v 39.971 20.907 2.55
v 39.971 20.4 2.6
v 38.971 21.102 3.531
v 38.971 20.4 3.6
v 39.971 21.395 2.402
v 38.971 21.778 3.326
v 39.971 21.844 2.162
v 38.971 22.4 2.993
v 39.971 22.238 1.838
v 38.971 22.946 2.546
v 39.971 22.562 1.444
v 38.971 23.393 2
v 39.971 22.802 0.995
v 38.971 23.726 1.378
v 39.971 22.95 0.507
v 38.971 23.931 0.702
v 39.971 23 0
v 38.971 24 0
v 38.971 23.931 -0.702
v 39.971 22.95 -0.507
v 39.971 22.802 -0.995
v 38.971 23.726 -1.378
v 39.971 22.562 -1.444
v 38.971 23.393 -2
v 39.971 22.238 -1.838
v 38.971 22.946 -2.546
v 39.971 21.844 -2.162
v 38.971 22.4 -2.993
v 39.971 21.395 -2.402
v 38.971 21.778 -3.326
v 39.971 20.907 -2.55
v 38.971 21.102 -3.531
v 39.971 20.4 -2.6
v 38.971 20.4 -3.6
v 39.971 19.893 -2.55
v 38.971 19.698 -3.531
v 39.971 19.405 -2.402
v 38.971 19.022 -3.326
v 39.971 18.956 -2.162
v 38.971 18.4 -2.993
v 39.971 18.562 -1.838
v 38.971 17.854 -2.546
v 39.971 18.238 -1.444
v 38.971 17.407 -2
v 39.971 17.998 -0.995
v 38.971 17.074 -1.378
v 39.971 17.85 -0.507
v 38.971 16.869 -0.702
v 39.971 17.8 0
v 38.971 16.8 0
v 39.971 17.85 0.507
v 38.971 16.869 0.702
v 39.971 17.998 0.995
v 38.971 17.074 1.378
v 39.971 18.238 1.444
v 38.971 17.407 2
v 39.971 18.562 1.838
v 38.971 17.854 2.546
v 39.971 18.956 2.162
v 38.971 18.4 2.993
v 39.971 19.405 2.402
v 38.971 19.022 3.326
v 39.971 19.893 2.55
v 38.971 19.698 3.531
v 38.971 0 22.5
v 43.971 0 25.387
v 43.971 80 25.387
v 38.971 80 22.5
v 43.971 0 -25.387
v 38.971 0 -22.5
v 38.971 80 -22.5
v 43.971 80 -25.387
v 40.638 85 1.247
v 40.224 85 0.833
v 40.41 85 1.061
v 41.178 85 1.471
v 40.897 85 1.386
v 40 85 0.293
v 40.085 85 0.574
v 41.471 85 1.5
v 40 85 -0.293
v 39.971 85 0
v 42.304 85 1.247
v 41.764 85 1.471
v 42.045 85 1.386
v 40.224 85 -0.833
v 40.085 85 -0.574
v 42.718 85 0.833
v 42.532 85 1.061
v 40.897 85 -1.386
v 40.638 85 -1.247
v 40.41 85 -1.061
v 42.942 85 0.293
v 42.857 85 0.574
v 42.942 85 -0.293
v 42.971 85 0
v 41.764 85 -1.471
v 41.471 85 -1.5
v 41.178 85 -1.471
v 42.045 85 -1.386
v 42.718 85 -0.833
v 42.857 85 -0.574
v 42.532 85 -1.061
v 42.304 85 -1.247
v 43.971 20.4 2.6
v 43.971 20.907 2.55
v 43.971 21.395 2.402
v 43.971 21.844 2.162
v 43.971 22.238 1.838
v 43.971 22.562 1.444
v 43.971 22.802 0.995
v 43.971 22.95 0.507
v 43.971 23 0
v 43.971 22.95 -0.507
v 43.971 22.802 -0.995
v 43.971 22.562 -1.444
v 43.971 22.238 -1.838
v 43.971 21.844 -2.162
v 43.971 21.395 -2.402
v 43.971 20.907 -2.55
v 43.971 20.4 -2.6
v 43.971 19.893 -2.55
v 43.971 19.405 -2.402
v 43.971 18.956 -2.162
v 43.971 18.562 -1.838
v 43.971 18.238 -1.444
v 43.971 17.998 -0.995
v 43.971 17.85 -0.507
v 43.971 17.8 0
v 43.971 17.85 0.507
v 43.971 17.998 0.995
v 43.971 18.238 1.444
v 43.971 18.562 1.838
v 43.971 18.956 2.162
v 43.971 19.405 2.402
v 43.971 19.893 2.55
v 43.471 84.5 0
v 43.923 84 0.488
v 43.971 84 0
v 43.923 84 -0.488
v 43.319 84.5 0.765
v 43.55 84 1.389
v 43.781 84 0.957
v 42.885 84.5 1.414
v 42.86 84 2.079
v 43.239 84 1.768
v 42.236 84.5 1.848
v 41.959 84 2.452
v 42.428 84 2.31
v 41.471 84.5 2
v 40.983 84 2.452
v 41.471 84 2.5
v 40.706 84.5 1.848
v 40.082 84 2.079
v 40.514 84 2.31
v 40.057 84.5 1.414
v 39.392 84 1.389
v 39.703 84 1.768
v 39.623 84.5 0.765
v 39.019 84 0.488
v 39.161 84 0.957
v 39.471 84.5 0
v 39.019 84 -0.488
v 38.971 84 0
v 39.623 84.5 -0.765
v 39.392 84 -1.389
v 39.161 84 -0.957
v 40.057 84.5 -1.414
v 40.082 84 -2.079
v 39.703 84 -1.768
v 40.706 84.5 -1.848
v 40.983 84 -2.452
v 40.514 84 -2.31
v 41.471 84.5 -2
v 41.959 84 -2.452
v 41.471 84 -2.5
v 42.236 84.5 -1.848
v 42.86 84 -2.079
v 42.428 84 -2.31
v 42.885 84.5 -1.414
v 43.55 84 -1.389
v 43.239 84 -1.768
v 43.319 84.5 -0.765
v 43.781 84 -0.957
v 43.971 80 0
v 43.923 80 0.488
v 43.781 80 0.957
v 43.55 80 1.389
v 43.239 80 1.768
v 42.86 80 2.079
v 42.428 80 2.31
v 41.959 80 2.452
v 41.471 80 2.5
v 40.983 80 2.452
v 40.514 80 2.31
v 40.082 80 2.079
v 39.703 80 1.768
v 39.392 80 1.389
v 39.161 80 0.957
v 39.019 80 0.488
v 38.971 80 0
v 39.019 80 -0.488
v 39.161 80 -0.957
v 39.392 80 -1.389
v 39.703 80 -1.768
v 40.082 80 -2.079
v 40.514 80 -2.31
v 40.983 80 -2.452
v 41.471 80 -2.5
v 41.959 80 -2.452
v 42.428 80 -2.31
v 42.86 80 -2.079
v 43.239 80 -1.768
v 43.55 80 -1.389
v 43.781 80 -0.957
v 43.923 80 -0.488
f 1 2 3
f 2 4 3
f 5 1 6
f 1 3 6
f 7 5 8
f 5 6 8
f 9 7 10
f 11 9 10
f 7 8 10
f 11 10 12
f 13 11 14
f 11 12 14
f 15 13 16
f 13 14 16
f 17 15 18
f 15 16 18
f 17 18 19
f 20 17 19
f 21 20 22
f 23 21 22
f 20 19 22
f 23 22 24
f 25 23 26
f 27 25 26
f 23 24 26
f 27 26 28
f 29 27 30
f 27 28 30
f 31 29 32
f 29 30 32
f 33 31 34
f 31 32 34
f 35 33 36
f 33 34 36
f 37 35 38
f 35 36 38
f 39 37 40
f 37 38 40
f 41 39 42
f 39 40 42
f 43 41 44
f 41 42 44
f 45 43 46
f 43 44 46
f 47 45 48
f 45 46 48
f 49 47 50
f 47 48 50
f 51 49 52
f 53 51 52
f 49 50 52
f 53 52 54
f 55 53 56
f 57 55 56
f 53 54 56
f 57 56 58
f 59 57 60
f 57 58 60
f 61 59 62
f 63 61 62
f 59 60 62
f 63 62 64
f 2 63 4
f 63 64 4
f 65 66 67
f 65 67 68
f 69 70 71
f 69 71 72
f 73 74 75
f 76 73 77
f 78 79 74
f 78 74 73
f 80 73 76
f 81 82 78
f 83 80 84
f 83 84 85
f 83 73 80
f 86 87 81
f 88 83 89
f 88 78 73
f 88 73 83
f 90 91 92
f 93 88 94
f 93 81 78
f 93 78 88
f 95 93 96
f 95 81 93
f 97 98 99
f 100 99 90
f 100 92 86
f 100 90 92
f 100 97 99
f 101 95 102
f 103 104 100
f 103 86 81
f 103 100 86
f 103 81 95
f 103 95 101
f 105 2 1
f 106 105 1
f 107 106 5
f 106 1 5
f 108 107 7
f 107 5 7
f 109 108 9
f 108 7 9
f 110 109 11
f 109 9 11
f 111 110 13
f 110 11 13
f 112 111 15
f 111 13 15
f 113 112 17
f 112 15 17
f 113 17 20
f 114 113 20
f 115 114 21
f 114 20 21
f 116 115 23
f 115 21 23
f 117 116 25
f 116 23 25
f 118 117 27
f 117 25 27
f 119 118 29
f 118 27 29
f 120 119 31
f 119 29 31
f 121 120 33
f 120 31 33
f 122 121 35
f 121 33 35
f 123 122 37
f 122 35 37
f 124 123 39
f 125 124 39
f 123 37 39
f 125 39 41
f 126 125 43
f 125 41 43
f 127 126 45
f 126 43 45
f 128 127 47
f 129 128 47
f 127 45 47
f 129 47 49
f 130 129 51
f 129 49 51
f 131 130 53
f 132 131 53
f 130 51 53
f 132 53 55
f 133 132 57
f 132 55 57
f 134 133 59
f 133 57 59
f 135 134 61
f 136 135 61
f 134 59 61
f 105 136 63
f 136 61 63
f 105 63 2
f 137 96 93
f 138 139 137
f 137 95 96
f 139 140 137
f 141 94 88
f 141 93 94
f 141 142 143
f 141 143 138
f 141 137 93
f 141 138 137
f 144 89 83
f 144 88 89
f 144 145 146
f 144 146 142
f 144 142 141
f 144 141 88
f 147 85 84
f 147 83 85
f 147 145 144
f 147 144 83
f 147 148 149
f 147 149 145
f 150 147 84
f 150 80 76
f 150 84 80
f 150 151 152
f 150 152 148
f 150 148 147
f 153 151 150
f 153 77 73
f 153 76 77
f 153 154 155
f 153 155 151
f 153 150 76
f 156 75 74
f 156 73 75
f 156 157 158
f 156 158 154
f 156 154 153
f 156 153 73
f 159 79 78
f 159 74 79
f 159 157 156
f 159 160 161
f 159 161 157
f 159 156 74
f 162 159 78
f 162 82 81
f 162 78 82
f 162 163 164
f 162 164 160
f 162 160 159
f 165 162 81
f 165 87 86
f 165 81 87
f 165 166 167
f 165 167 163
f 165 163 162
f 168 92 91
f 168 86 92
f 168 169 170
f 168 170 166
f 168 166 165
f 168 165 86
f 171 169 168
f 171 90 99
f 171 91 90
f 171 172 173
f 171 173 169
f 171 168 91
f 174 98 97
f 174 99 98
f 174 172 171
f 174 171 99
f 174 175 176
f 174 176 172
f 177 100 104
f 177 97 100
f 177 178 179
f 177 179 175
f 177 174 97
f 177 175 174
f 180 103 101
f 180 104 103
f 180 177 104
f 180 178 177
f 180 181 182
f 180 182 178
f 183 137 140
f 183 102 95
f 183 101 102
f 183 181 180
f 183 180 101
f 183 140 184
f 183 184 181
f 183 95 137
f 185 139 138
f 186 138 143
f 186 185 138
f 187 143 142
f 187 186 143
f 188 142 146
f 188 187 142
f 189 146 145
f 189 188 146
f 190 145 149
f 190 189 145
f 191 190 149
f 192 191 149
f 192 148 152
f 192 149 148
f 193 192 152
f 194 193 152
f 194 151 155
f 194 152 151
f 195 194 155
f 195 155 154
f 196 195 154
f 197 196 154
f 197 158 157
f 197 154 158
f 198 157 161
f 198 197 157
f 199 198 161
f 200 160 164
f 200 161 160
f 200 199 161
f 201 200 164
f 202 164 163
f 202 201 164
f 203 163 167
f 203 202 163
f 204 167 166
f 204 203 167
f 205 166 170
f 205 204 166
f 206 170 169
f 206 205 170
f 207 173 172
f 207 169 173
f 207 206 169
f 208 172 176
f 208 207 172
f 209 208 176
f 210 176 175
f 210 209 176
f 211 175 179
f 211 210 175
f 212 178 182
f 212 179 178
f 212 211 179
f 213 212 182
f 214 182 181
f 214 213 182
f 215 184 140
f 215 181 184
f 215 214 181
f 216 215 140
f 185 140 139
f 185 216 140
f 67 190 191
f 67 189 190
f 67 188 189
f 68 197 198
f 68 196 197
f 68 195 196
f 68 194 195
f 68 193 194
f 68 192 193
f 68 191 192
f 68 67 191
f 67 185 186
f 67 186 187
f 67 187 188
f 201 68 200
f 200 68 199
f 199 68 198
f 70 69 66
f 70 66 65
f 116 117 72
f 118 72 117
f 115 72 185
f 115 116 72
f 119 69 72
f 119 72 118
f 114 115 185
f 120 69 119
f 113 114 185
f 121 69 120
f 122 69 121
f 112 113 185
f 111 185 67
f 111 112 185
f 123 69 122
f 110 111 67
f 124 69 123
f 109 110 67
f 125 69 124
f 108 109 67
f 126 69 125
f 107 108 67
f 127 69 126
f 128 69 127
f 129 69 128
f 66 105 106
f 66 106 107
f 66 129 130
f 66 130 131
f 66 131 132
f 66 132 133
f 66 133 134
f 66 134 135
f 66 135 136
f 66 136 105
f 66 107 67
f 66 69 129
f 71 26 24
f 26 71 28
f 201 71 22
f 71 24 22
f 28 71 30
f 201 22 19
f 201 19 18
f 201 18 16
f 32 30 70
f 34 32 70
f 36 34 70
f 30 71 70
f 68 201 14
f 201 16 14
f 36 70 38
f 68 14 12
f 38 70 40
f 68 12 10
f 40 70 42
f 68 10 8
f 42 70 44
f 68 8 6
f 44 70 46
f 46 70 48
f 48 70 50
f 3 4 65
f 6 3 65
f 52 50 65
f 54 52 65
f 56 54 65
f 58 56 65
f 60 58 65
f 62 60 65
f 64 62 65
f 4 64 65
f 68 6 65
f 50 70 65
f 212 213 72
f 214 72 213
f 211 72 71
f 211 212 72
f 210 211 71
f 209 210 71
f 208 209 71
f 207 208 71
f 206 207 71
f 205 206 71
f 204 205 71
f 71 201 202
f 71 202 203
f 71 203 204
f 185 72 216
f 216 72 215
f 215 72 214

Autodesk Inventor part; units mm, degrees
ref_plane "YZ Plane" through (0, 0, 0) normal (1, 0, 0) x (0, 1, 0)
ref_plane "XZ Plane" through (0, 0, 0) normal (0, 1, 0) x (-1, 0, 0)
ref_plane "XY Plane" through (0, 0, 0) normal (0, 0, 1) x (1, 0, 0)
sketch "스케치2" plane through (0, 0, 0) normal (0, 1, 0) x (-1, 0, 0)
  line L0 (0, 45) -> (38.9711, 22.5)
  line L1 (38.9711, 22.5) -> (38.9711, -22.5)
  line L2 (38.9711, -22.5) -> (0, -45)
  line L3 (0, -45) -> (-38.9711, -22.5)
  line L4 (-38.9711, -22.5) -> (-38.9711, 22.5)
  line L5 (-38.9711, 22.5) -> (0, 45)
  line L6 (0, 50.7735) -> (43.9711, 25.3868)
  line L7 (43.9711, 25.3868) -> (43.9711, -25.3868)
  line L8 (43.9711, -25.3868) -> (0, -50.7735)
  line L9 (0, -50.7735) -> (-43.9711, -25.3868)
  line L10 (-43.9711, -25.3868) -> (-43.9711, 25.3868)
  line L11 (-43.9711, 25.3868) -> (0, 50.7735)
  line L12 (-43.9711, 25.3868) -> (-38.9711, 22.5)
  line L13 (-38.9711, -22.5) -> (-43.9711, -25.3868)
  point P0 (0, 0)
  point P1 (0, 0)
  dimension "d0" = 45
  dimension "d1" = 5
extrude "돌출1" add sketch "스케치2" along normal blind 80 contours L4 L13 L10 L12
sketch "스케치3" plane through (38.9711, 0, -22.5) normal (-1, 0, 0) x (0, 0, 1)
  line L0 (0, 0) -> (45, 0) construction
  circle A0 centre (22.5, 20.4) radius 2.6
  point P0 (22.5, 0)
  point P1 (22.5, 0)
  dimension "d4" = 5.2
  dimension "d5" = 20.4
extrude "돌출2" cut sketch "스케치3" against normal through all
sketch "스케치4" plane through (0, 80, 0) normal (0, 1, 0) x (1, 0, 0)
  line L0 (38.9711, 22.5) -> (38.9711, -22.5) construction
  circle A0 centre (41.4711, 0) radius 2.5
  point P0 (0, 0)
  dimension "d8" = 5
extrude "돌출3" add sketch "스케치4" along normal blind 5
chamfer "모따기1" distance 1 angle 45 2 edges at (38.9711, 85, 0) (38.9711, 20.4, -2.6)
sketch "스케치5" plane through (43.9711, 0, 25.3868) normal (1, 0, 0) x (0, 0, -1)
  line L0 (50.7735, 0) -> (50.7735, 80) construction
  line L1 (25.3868, 80) -> (50.7735, 80) construction
  line L2 (0, 0) -> (0, 80) construction
  circle A0 centre (25.3868, 60) radius 2.6
  circle A1 centre (13.3868, 60) radius 2.6
  circle A2 centre (37.3868, 60) radius 2.6
  line L3 (0, 60) -> (50.7735, 60)
  point P0 (25.3868, 0)
  dimension "d11" = 20
  dimension "d12" = 0
  dimension "d13" = 0
  dimension "d14" = 0
  dimension "d15" = 12
  dimension "d16" = 12
  dimension "d17" = 5.2
  dimension "d18" = 5.2
  dimension "d19" = 5.2
properties part number "col_face"
